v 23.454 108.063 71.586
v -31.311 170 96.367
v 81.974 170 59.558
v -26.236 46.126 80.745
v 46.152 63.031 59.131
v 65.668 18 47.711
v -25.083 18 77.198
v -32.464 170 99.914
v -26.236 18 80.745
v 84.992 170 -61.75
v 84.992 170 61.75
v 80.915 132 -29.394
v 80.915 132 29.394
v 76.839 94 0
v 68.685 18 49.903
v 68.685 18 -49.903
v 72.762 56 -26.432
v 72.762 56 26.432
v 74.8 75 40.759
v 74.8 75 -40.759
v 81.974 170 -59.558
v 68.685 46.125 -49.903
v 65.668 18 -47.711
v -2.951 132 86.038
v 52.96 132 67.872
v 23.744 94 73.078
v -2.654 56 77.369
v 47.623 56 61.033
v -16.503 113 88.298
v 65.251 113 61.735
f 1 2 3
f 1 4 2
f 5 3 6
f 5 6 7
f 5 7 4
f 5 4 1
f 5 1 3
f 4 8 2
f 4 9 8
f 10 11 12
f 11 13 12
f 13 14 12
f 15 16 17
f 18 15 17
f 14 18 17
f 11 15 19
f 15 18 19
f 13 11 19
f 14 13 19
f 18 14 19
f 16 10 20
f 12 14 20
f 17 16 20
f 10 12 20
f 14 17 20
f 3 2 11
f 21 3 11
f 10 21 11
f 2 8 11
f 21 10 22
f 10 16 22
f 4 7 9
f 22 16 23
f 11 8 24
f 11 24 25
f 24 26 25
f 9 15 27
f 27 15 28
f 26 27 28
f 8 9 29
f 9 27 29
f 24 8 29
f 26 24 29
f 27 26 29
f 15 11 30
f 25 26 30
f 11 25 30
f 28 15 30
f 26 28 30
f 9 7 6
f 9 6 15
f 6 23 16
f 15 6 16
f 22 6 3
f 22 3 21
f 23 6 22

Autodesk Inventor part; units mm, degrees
sketch "草图1" plane through (0, 0, 0) normal (0, 1, 0) x (-1, 0, 0)
  line L0 (82.5131, 0) -> (25.498, -78.4746)
  line L1 (25.498, -78.4746) -> (-66.7545, -48.5)
  line L2 (-66.7545, -48.5) -> (-66.7545, 48.5)
  line L3 (-66.7545, 48.5) -> (25.498, 78.4746)
  line L4 (25.498, 78.4746) -> (82.5131, 0)
  point P0 (0, 0)
  point P1 (0, 0)
  dimension "d0" = 97
ref_plane "工作平面1" through (0, 170, 0) normal (0, 1, 0) x (-1, 0, 0)
sketch "草图2" plane through (0, 170, 0) normal (0, 1, 0) x (-1, 0, 0)
  line L0 (105.0554, 0) -> (32.4639, -99.9136)
  line L1 (32.4639, -99.9136) -> (-84.9916, -61.75)
  line L2 (-84.9916, -61.75) -> (-84.9916, 61.75)
  line L3 (-84.9916, 61.75) -> (32.4639, 99.9136)
  line L4 (32.4639, 99.9136) -> (105.0554, 0)
  point P0 (0, 0)
  point P1 (0, 0)
  dimension "d2" = 123.5
loft "放样1" add profiles "草图2", "草图1"
sketch "草图3" plane through (84.9916, 170, 61.75) normal (0, 1, 0) x (1, 0, 0)
  line L0 (-153.2988, 61.75) -> (-106.0997, 126.7141)
  line L1 (-106.0997, 126.7141) -> (-29.7298, 101.9)
  line L2 (-29.7298, 101.9) -> (-29.7298, 21.6)
  line L3 (-29.7298, 21.6) -> (-106.0997, -3.2141)
  line L4 (-106.0997, -3.2141) -> (-153.2988, 61.75)
  point P0 (-84.9916, 61.75)
  point P1 (-84.9916, 61.75)
  dimension "d7" = 80.3
extrude "拉伸1" cut sketch "草图3" against normal blind 164
shell "抽壳1" thickness 3 removed faces 1 at (10.4732, 170, -75.5426)
sketch "草图5" plane through (66.7545, 0, -48.5) normal (0, -1, 0) x (1, 0, 0)
  line L0 (-98.0659, 144.8667) -> (-91.2229, 123.806) projected
  line L1 (-106.5917, 71.5) -> (-123.9122, 81.5)
  line L2 (-107.7408, 69.3836) -> (-125.561, 78.4634)
  arc A0 (-106.5917, 71.5) -> (-107.7408, 69.3836) centre (-66.7545, 48.5) ccw
  arc A1 (-123.9122, 81.5) -> (-125.561, 78.4634) centre (-66.7545, 48.5) ccw
  point P0 (-99.2814, 81.0269)
  dimension "d37" = 132
  dimension "d38" = 92
  dimension "d40" = 3
extrude "拉伸2" add sketch "草图5" along normal blind 3
sketch "草图7" plane through (66.7545, -3, -48.5) normal (0, -1, 0) x (1, 0, 0)
  arc A0 (-100.9392, 79.28) -> (-106.5917, 71.5) centre (-66.7545, 48.5) ccw
  arc A1 (-115.8021, 92.6626) -> (-125.561, 78.4634) centre (-66.7545, 48.5) ccw
  arc A2 (-100.9392, 79.28) -> (-107.7408, 69.3836) centre (-66.7545, 48.5) ccw
  line L0 (-100.9392, 79.28) -> (-115.8021, 92.6626)
  line L1 (-125.561, 78.4634) -> (-107.7408, 69.3836) projected
  line L2 (-107.7408, 69.3836) -> (-125.561, 78.4634)
  dimension "d25" = 92
  dimension "d41" = 15
extrude "拉伸3" add sketch "草图7" along normal blind 3
chamfer "倒角1" distance 1 angle 45 1 edges at (-41.6161, -3, 37.4713)
sketch "草图8" plane through (66.7545, 0, -48.5) normal (0, -1, 0) x (1, 0, 0)
  circle A0 centre (-66.7545, 48.5) radius 15
  dimension "d100" = 30
extrude "拉伸4" add sketch "草图8" along normal blind 30
pattern_circular "环形阵列1" count 10 over 360 about axis through (0, -10, 0) along (0, 1, 0) of "拉伸3", "拉伸2", "倒角1"
sketch "草图9" plane through (64.0591, 3, 46.5417) normal (0, 1, 0) x (1, 0, 0)
  line L0 (-132.3664, 46.5417) -> (-85.1672, 111.5058) projected
  line L1 (-85.1672, -18.4224) -> (-132.3664, 46.5417) projected
  line L2 (-8.7974, 6.3917) -> (-85.1672, -18.4224) projected
  line L3 (-8.7974, 86.6917) -> (-8.7974, 6.3917) projected
  line L4 (-85.1672, 111.5058) -> (-8.7974, 86.6917) projected
  line L5 (-136.0746, 46.5417) -> (-86.3131, -21.9491) projected
  line L6 (-86.3131, -21.9491) -> (-5.7974, 4.2121) projected
  line L7 (-5.7974, 4.2121) -> (-5.7974, 88.8713) projected
  line L8 (-5.7974, 88.8713) -> (-86.3131, 115.0325) projected
  line L9 (-86.3131, 115.0325) -> (-136.0746, 46.5417) projected
  line L10 (-85.1672, -18.4224) -> (-132.3664, 46.5417) projected
  line L11 (-132.3664, 46.5417) -> (-85.1672, 111.5058) projected
  line L12 (-85.1672, 111.5058) -> (-8.7974, 86.6917) projected
  line L13 (-8.7974, 86.6917) -> (-8.7974, 6.3917) projected
  line L14 (-8.7974, 6.3917) -> (-85.1672, -18.4224) projected
  line L15 (-143.2406, 46.5417) -> (-88.5276, 121.8477) projected
  line L16 (-88.5276, -28.7643) -> (-143.2406, 46.5417) projected
  line L17 (0, 0) -> (-88.5276, -28.7643) projected
  line L18 (0, 93.0834) -> (0, 0) projected
  line L19 (-88.5276, 121.8477) -> (0, 93.0834) projected
  line L20 (-145.4076, 46.5417) -> (-89.1972, 123.9087)
  line L21 (-89.1972, 123.9087) -> (1.7532, 94.3571)
  line L22 (1.7532, 94.3571) -> (1.7532, -1.2738)
  line L23 (1.7532, -1.2738) -> (-89.1972, -30.8253)
  line L24 (-89.1972, -30.8253) -> (-145.4076, 46.5417)
  point P0 (-64.0591, 46.5417)
extrude "拉伸5" add sketch "草图9" along normal blind 15 contours L15 L19 L18 L17 L16 | L20 L21 L22 L23 L24
sketch "草图10" plane through (84.9916, 6, 61.75) normal (0, 1, 0) x (1, 0, 0)
  line L0 (-153.2988, 61.75) -> (-106.0997, 126.7141) projected
  line L1 (-106.0997, -3.2141) -> (-153.2988, 61.75) projected
  line L2 (-29.7298, 21.6) -> (-106.0997, -3.2141) projected
  line L3 (-29.7298, 101.9) -> (-29.7298, 21.6) projected
  line L4 (-106.0997, 126.7141) -> (-29.7298, 101.9) projected
  line L5 (-107.2456, 130.2408) -> (-157.007, 61.75) projected
  line L6 (-26.7298, 104.0796) -> (-107.2456, 130.2408) projected
  line L7 (-26.7298, 19.4204) -> (-26.7298, 104.0796) projected
  line L8 (-107.2456, -6.7408) -> (-26.7298, 19.4204) projected
  line L9 (-157.007, 61.75) -> (-107.2456, -6.7408) projected
  line L10 (-166.1621, 61.75) -> (-110.0746, 138.9477) projected
  line L11 (-110.0746, -15.4477) -> (-166.1621, 61.75) projected
  line L12 (-19.3233, 14.0392) -> (-110.0746, -15.4477) projected
  line L13 (-19.3233, 109.4608) -> (-19.3233, 14.0392) projected
  line L14 (-110.0746, 138.9477) -> (-19.3233, 109.4608) projected
  point P0 (-84.9916, 61.75)
sketch "草图11" plane through (64.0591, 18, 46.5417) normal (0, 1, 0) x (1, 0, 0)
  line L0 (-64.0591, 46.5417) -> (2.6954, 46.5417) construction
  line L1 (-86.3131, 115.0325) -> (-136.0746, 46.5417) projected
  line L2 (-5.7974, 88.8713) -> (-86.3131, 115.0325) projected
  line L3 (-5.7974, 4.2121) -> (-5.7974, 88.8713) projected
  line L4 (-86.3131, -21.9491) -> (-5.7974, 4.2121) projected
  line L5 (-136.0746, 46.5417) -> (-86.3131, -21.9491) projected
  line L6 (-145.2296, 46.5417) -> (-89.1422, 123.7394) projected
  line L7 (-89.1422, -30.656) -> (-145.2296, 46.5417) projected
  line L8 (1.6092, -1.1691) -> (-89.1422, -30.656) projected
  line L9 (1.6092, 94.2525) -> (1.6092, -1.1691) projected
  line L10 (-89.1422, 123.7394) -> (1.6092, 94.2525) projected
  circle A0 centre (-2.0908, 11.2121) radius 1.25
  line L11 (-5.7974, 4.2121) -> (1.6092, -1.1691) construction
  line L12 (-5.7974, 4.2121) -> (-5.7974, 88.8713) projected
  line L13 (-86.3131, -21.9491) -> (-5.7974, 4.2121) projected
  line L14 (1.6092, -1.1691) -> (-89.1422, -30.656) projected
  line L15 (1.6092, 94.2525) -> (1.6092, -1.1691) projected
  circle A1 centre (-11.3094, -1.4762) radius 1.25
  line L16 (-2.0941, 7.5215) -> (-0.5941, 7.5215)
  line L17 (-0.5941, 7.5215) -> (-0.5941, 0.4317)
  line L18 (-2.0941, 7.5215) -> (-3.5941, 7.5215)
  line L19 (-3.5941, 7.5215) -> (-3.5941, 2.6113)
  line L20 (-7.8005, -0.3326) -> (-7.3369, -1.7592)
  line L21 (-7.3369, -1.7592) -> (-0.5941, 0.4317)
  line L22 (-7.8005, -0.3326) -> (-8.264, 1.094)
  line L23 (-8.264, 1.094) -> (-3.5941, 2.6113)
  dimension "d63" = 2.5
  dimension "d69" = 3.7
  dimension "d131" = 3.6906
extrude "拉伸7" cut sketch "草图11" against normal blind 3 contours A0 | A1 | L16 L17 L21 L20 L22 L23 L19 L18
extrude "拉伸8" add sketch "草图10" along normal blind 10 and the other way blind 3 contours L10 L14 L13 L12 L11
extrude "拉伸9" cut sketch "草图10" along normal blind 10 and the other way blind 3 contours L10 L14 L13 L12 L11
ref_plane "工作平面2" through (84.9916, 7, 61.75) normal (0, 1, 0) x (1, 0, 0)
sketch "草图12" plane through (84.9916, 7, 61.75) normal (0, 1, 0) x (1, 0, 0)
  line L0 (-107.2456, -6.7408) -> (-26.7298, 19.4204) projected
  line L1 (-60.7054, 8.3811) -> (-61.6324, 11.2342)
  line L2 (-29.7298, 21.6) -> (-106.0997, -3.2141) projected
  line L3 (-89.8404, 2.0689) -> (-88.9133, -0.7843)
  line L4 (-107.2456, -6.7408) -> (-26.7298, 19.4204) projected
  line L5 (-29.7298, 21.6) -> (-106.0997, -3.2141) projected
  line L6 (-63.5345, 10.6162) -> (-62.6075, 7.763)
  line L7 (-65.4366, 9.9982) -> (-64.5096, 7.145)
  line L8 (-67.3388, 9.3801) -> (-66.4117, 6.527)
  line L9 (-69.2409, 8.7621) -> (-68.3138, 5.9089)
  line L10 (-71.143, 8.1441) -> (-70.2159, 5.2909)
  line L11 (-73.0451, 7.526) -> (-72.118, 4.6729)
  line L12 (-74.9472, 6.908) -> (-74.0202, 4.0548)
  line L13 (-76.7905, 6.3091) -> (-75.7638, 3.4883)
  line L14 (-84.134, 3.923) -> (-83.207, 1.0698)
  line L15 (-86.0362, 3.305) -> (-85.1091, 0.4518)
  line L16 (-87.9383, 2.6869) -> (-87.0112, -0.1662)
  line L17 (-80.3298, 5.1591) -> (-79.4028, 2.3059)
  line L18 (-82.2319, 4.541) -> (-81.3049, 1.6879)
  line L19 (-78.4277, 5.7771) -> (-77.5006, 2.9239)
  line L20 (-61.6324, 11.2342) -> (-63.5345, 10.6162)
  line L21 (-62.6075, 7.763) -> (-60.7054, 8.3811)
  line L22 (-66.4117, 6.527) -> (-64.5096, 7.145)
  line L23 (-65.4366, 9.9982) -> (-67.3388, 9.3801)
  line L24 (-70.2159, 5.2909) -> (-68.3138, 5.9089)
  line L25 (-69.2409, 8.7621) -> (-71.143, 8.1441)
  line L26 (-74.0202, 4.0548) -> (-72.118, 4.6729)
  line L27 (-73.0451, 7.526) -> (-74.9472, 6.908)
  line L28 (-76.7905, 6.3091) -> (-78.4277, 5.7771)
  line L29 (-77.5006, 2.9239) -> (-75.7638, 3.4883)
  line L30 (-81.3049, 1.6879) -> (-79.4028, 2.3059)
  line L31 (-80.3298, 5.1591) -> (-82.2319, 4.541)
  line L32 (-84.134, 3.923) -> (-86.0362, 3.305)
  line L33 (-87.9383, 2.6869) -> (-89.8404, 2.0689)
  line L34 (-88.9133, -0.7843) -> (-87.0112, -0.1662)
  line L35 (-85.1091, 0.4518) -> (-83.207, 1.0698)
  line L36 (-58.8033, 8.9991) -> (-59.7303, 11.8523)
  line L37 (-56.9011, 9.6171) -> (-57.8282, 12.4703)
  line L38 (-54.999, 10.2352) -> (-55.9261, 13.0883)
  line L39 (-53.0969, 10.8532) -> (-54.024, 13.7064)
  point P0 (-84.9916, 61.75)
  dimension "d73" = 2
  dimension "d74" = 2
  dimension "d75" = 2
  dimension "d76" = 2
  dimension "d77" = 2
  dimension "d78" = 2
  dimension "d79" = 2
  dimension "d80" = 2
  dimension "d81" = 2
  dimension "d82" = 2
  dimension "d83" = 2
  dimension "d84" = 2
  dimension "d85" = 2
  dimension "d86" = 2
  dimension "d88" = 2
  dimension "d89" = 2
  dimension "d90" = 2
  dimension "d91" = 2
extrude "拉伸10" cut sketch "草图12" along normal blind 7 contours L3 L2 L16 L0 | L15 L2 L14 L0 | L18 L2 L17 L0 | L19 L2 L13 L0 | L12 L2 L11 L0 | L10 L2 L9 L0 | L8 L2 L7 L0 | L6 L2 L1 L0 | L36 L2 L37 L0 | L38 L2 L39 L0
pattern_circular "环形阵列2" count 5 over 360 about axis through (0, 0, 0) along (0, -1, 0) of "拉伸10"
sketch "草图13" plane through (66.7545, 0, -48.5) normal (0, -1, 0) x (1, 0, 0)
  line L0 (1.9326, 98.4258) -> (-1.1068, 96.2175) construction
  line L1 (18.2371, 110.25) -> (0, 97) construction
  line L2 (-16.2555, 104.3138) -> (1.9326, 98.4258)
  line L3 (1.9326, 98.4258) -> (1.9326, 79.28)
  line L4 (-14.6399, 100.6147) -> (-1.1068, 96.2175)
  line L5 (-1.0862, 96.2108) -> (-1.0862, 81.9597)
  line L6 (-1.0862, 81.9597) -> (1.9326, 79.28)
  line L7 (-14.6399, 100.6147) -> (-16.2555, 104.3138)
  line L8 (1.9326, 98.4258) -> (1.9326, 79.28)
  line L9 (1.9326, 79.28) -> (-1.0862, 81.9597)
  line L10 (-1.0862, 0.7892) -> (-1.0862, 96.2108) projected
  line L11 (-1.0862, 81.9597) -> (-1.0862, 96.2108)
  line L12 (-1.0862, 96.2108) -> (-14.6399, 100.6147)
  line L13 (-91.8376, 125.6977) -> (-1.0862, 96.2108) projected
  line L14 (0, 97) -> (-92.2525, 126.9746) projected
  line L15 (-14.6399, 100.6147) -> (-16.2555, 104.3138)
  line L16 (-16.2555, 104.3138) -> (1.9326, 98.4258)
  point P0 (-66.7545, 48.5)
  point P1 (18.2371, 110.25)
extrude "拉伸11" cut sketch "草图13" against normal blind 16
sketch "草图14" plane through (0, -30, 0) normal (0, -1, 0) x (1, 0, 0)
  line L0 (11.4602, -0.9019) -> (-11.5398, -0.9019)
  line L1 (-11.5398, -0.9019) -> (-11.5398, 0.7981)
  line L2 (-11.5398, 0.7981) -> (11.4602, 0.7981)
  line L3 (11.4602, 0.7981) -> (11.4602, -0.9019)
  line L4 (15.9292, -0.0519) -> (-16.622, -0.0519) construction
  line L5 (-0.0398, 4.6584) -> (-0.0398, -5.7431) construction
  point P0 (0, 0)
  dimension "d94" = 23
  dimension "d95" = 1.7
extrude "拉伸12" cut sketch "草图14" along normal blind 10 and the other way blind 54.75
sketch "草图15" plane through (0, -30, 0) normal (0, -1, 0) x (1, 0, 0)
  line L0 (11.4602, 0.7981) -> (-11.5398, 0.7981) projected
  line L1 (9.9602, 0.7981) -> (-10.0398, 0.7981)
  line L2 (-10.0398, 0.7981) -> (-10.0398, 2.5981)
  line L3 (-10.0398, 2.5981) -> (9.9602, 2.5981)
  line L4 (9.9602, 2.5981) -> (9.9602, 0.7981)
  line L5 (11.4602, -0.9019) -> (-11.5398, -0.9019) projected
  line L6 (-0.0398, 30.3943) -> (-0.0398, -31.216) construction
  point P0 (0, 0)
  dimension "d101" = 3.5
  dimension "d102" = 20
extrude "拉伸13" cut sketch "草图15" against normal blind 30
sketch "草图16" plane through (0, -30, 0) normal (0, -1, 0) x (1, 0, 0)
  line L0 (11.4602, 0.7981) -> (-11.5398, 0.7981) projected
  line L1 (-5.5398, 0.7981) -> (5.4602, 0.7981)
  line L2 (5.4602, 0.7981) -> (5.4602, 6.5981)
  line L3 (5.4602, 6.5981) -> (-5.5398, 6.5981)
  line L4 (-5.5398, 6.5981) -> (-5.5398, 0.7981)
  line L5 (11.4602, -0.9019) -> (-11.5398, -0.9019) projected
  line L6 (-0.0398, 25.7819) -> (-0.0398, -22.2478) construction
  point P0 (0, 0)
  dimension "d105" = 7.5
  dimension "d106" = 11
extrude "拉伸14" cut sketch "草图16" against normal blind 6
ref_plane "工作平面3" through (0, -28, 0) normal (0, -1, 0) x (1, 0, 0)
sketch "草图18" plane through (0, -28, 0) normal (0, -1, 0) x (1, 0, 0)
  line L0 (5.4602, 6.5981) -> (5.4602, 2.5981) projected
  line L1 (5.4602, 2.5981) -> (9.9602, 2.5981) projected
  line L2 (9.9602, 2.5981) -> (9.9602, 0.7981) projected
  line L3 (9.9602, 0.7981) -> (11.4602, 0.7981) projected
  line L4 (11.4602, 0.7981) -> (11.4602, -0.9019) projected
  line L5 (11.4602, -0.9019) -> (-11.5398, -0.9019) projected
  line L6 (-11.5398, -0.9019) -> (-11.5398, 0.7981) projected
  line L7 (-11.5398, 0.7981) -> (-10.0398, 0.7981) projected
  line L8 (-10.0398, 0.7981) -> (-10.0398, 2.5981) projected
  line L9 (-10.0398, 2.5981) -> (-5.5398, 2.5981) projected
  line L10 (-5.5398, 2.5981) -> (-5.5398, 6.5981) projected
  line L11 (-5.5398, 6.5981) -> (5.4602, 6.5981) projected
  circle A0 centre (0, 0) radius 15 projected
  line L12 (-12.5398, -1.9019) -> (12.4602, -1.9019)
  line L13 (12.4602, -1.9019) -> (12.4602, 1.7981)
  line L14 (12.4602, 1.7981) -> (10.9602, 1.7981)
  line L15 (10.9602, 1.7981) -> (10.9602, 3.5981)
  line L16 (10.9602, 3.5981) -> (6.4602, 3.5981)
  line L17 (6.4602, 3.5981) -> (6.4602, 7.5981)
  line L18 (6.4602, 7.5981) -> (-6.5398, 7.5981)
  line L19 (-6.5398, 7.5981) -> (-6.5398, 3.5981)
  line L20 (-6.5398, 3.5981) -> (-11.0398, 3.5981)
  line L21 (-11.0398, 3.5981) -> (-11.0398, 1.7981)
  line L22 (-11.0398, 1.7981) -> (-12.5398, 1.7981)
  line L23 (-12.5398, 1.7981) -> (-12.5398, -1.9019)
  circle A1 centre (0, 0) radius 14
  point P0 (0, 0)
  dimension "d110" = 1
  dimension "d111" = 1
extrude "拉伸15" cut sketch "草图18" against normal blind 30 contours A1
sketch "草图19" plane through (66.7545, 0, -48.5) normal (0, -1, 0) x (1, 0, 0)
  line L0 (-60.2943, 56.0981) -> (-73.2943, 56.0981) projected
  line L1 (-73.2943, 52.0981) -> (-77.7943, 52.0981) projected
  line L2 (-60.2943, 56.0981) -> (-73.2943, 56.0981)
  line L3 (-73.2943, 56.0981) -> (-73.2943, 52.0981)
  line L4 (-73.2943, 52.0981) -> (-60.2943, 52.0981)
  line L5 (-60.2943, 52.0981) -> (-60.2943, 56.0981)
  point P0 (-66.7545, 48.5)
extrude "拉伸16" cut sketch "草图19" along normal blind 22 and the other way blind 2
sketch "草图21" plane through (0, -30, 0) normal (0, -1, 0) x (1, 0, 0)
  line L0 (5.4602, 6.5981) -> (5.4602, 2.5981) projected
  line L1 (5.4602, 2.5981) -> (9.9602, 2.5981) projected
  line L2 (9.9602, 2.5981) -> (9.9602, 0.7981) projected
  line L3 (9.9602, 0.7981) -> (11.4602, 0.7981) projected
  line L4 (11.4602, 0.7981) -> (11.4602, -0.9019) projected
  line L5 (11.4602, -0.9019) -> (-11.5398, -0.9019) projected
  line L6 (-11.5398, -0.9019) -> (-11.5398, 0.7981) projected
  line L7 (-11.5398, 0.7981) -> (-10.0398, 0.7981) projected
  line L8 (-10.0398, 0.7981) -> (-10.0398, 2.5981) projected
  line L9 (-10.0398, 2.5981) -> (-5.5398, 2.5981) projected
  line L10 (-5.5398, 2.5981) -> (-5.5398, 6.5981) projected
  line L11 (-5.5398, 6.5981) -> (5.4602, 6.5981) projected
  circle A0 centre (0, 0) radius 15 projected
  point P0 (0, 0)
extrude "拉伸17" add sketch "草图21" along normal blind 3
sketch "草图22" plane through (5.4602, -24, 6.5981) normal (0, 0, -1) x (-1, 0, 0)
  line L0 (9.1141, -4) -> (1.9525, -4)
  line L1 (1.9525, -4) -> (9.1141, -4)
  line L2 (9.1141, -4) -> (9.1141, -9.2971)
  line L3 (9.1141, -9.2971) -> (1.9525, -9.2971)
  line L4 (1.9525, -9.2971) -> (1.9525, -4)
  point P0 (5.4602, 24)
extrude "拉伸18" cut sketch "草图22" against normal blind 10
sketch "草图23" plane through (0, -33, 0) normal (0, -1, 0) x (1, 0, 0)
  line L0 (5.555, -0.8779) -> (-5.9531, -0.8779)
  line L1 (-5.9531, -0.8779) -> (-5.9531, -3.3779)
  line L2 (-5.9531, -3.3779) -> (5.555, -3.3779)
  line L3 (5.555, -3.3779) -> (5.555, -0.8779)
  point P0 (0, 0)
  dimension "d125" = 2.5
extrude "拉伸19" cut sketch "草图23" against normal blind 10
sketch "草图24" plane through (64.0591, 18, 46.5417) normal (0, 1, 0) x (1, 0, 0)
  line L0 (-75.5989, 45.7436) -> (-75.5989, 47.4436) projected
  line L1 (-75.5989, 47.4436) -> (-52.5989, 47.4436) projected
  line L2 (-52.5989, 47.4436) -> (-52.5989, 45.7436) projected
  line L3 (-52.5989, 45.7436) -> (-75.5989, 45.7436) projected
  line L4 (-132.3664, 46.5417) -> (-85.1672, 111.5058) projected
  line L5 (-85.1672, -18.4224) -> (-132.3664, 46.5417) projected
  line L6 (-8.7974, 6.3917) -> (-85.1672, -18.4224) projected
  line L7 (-8.7974, 86.6917) -> (-8.7974, 6.3917) projected
  line L8 (-85.1672, 111.5058) -> (-8.7974, 86.6917) projected
  line L9 (-2.9869, 2.1701) -> (-87.3867, -25.2531)
  line L10 (-87.3867, -25.2531) -> (-139.5486, 46.5417)
  line L11 (-139.5486, 46.5417) -> (-87.3867, 118.3364)
  line L12 (-87.3867, 118.3364) -> (-2.9869, 90.9133)
  line L13 (-2.9869, 90.9133) -> (-2.9869, 2.1701)
  line L14 (36.2149, -26.3117) -> (-102.3604, -71.3375)
  line L15 (-102.3604, -71.3375) -> (-188.0047, 46.5417)
  line L16 (-188.0047, 46.5417) -> (-102.3604, 164.4209)
  line L17 (-102.3604, 164.4209) -> (36.2149, 119.3951)
  line L18 (36.2149, 119.3951) -> (36.2149, -26.3117)
  point P0 (-64.0591, 46.5417)
extrude "拉伸20" cut sketch "草图24" along normal blind 1000 contours L14 L15 L16 L17 L18 keep common part
sketch "草图25" plane through (84.9916, 170, 61.75) normal (0, 1, 0) x (1, 0, 0)
  line L0 (-117.4555, -38.1636) -> (-111.2271, -18.9947) projected
  line L1 (-84.9916, 61.75) -> (-117.4555, -38.1636)
  line L2 (-117.4555, -38.1636) -> (85.1695, -33.7238)
  line L3 (85.1695, -33.7238) -> (60.3666, 156.0873)
  line L4 (0, 123.5) -> (-16.3061, 111.6529) projected
  line L5 (60.3666, 156.0873) -> (0, 123.5)
  line L6 (0, 123.5) -> (-84.9916, 61.75)
extrude "拉伸21" cut sketch "草图25" against normal blind 200 keep common part
properties part number "花盆主体" material "尼龙 6/6"
